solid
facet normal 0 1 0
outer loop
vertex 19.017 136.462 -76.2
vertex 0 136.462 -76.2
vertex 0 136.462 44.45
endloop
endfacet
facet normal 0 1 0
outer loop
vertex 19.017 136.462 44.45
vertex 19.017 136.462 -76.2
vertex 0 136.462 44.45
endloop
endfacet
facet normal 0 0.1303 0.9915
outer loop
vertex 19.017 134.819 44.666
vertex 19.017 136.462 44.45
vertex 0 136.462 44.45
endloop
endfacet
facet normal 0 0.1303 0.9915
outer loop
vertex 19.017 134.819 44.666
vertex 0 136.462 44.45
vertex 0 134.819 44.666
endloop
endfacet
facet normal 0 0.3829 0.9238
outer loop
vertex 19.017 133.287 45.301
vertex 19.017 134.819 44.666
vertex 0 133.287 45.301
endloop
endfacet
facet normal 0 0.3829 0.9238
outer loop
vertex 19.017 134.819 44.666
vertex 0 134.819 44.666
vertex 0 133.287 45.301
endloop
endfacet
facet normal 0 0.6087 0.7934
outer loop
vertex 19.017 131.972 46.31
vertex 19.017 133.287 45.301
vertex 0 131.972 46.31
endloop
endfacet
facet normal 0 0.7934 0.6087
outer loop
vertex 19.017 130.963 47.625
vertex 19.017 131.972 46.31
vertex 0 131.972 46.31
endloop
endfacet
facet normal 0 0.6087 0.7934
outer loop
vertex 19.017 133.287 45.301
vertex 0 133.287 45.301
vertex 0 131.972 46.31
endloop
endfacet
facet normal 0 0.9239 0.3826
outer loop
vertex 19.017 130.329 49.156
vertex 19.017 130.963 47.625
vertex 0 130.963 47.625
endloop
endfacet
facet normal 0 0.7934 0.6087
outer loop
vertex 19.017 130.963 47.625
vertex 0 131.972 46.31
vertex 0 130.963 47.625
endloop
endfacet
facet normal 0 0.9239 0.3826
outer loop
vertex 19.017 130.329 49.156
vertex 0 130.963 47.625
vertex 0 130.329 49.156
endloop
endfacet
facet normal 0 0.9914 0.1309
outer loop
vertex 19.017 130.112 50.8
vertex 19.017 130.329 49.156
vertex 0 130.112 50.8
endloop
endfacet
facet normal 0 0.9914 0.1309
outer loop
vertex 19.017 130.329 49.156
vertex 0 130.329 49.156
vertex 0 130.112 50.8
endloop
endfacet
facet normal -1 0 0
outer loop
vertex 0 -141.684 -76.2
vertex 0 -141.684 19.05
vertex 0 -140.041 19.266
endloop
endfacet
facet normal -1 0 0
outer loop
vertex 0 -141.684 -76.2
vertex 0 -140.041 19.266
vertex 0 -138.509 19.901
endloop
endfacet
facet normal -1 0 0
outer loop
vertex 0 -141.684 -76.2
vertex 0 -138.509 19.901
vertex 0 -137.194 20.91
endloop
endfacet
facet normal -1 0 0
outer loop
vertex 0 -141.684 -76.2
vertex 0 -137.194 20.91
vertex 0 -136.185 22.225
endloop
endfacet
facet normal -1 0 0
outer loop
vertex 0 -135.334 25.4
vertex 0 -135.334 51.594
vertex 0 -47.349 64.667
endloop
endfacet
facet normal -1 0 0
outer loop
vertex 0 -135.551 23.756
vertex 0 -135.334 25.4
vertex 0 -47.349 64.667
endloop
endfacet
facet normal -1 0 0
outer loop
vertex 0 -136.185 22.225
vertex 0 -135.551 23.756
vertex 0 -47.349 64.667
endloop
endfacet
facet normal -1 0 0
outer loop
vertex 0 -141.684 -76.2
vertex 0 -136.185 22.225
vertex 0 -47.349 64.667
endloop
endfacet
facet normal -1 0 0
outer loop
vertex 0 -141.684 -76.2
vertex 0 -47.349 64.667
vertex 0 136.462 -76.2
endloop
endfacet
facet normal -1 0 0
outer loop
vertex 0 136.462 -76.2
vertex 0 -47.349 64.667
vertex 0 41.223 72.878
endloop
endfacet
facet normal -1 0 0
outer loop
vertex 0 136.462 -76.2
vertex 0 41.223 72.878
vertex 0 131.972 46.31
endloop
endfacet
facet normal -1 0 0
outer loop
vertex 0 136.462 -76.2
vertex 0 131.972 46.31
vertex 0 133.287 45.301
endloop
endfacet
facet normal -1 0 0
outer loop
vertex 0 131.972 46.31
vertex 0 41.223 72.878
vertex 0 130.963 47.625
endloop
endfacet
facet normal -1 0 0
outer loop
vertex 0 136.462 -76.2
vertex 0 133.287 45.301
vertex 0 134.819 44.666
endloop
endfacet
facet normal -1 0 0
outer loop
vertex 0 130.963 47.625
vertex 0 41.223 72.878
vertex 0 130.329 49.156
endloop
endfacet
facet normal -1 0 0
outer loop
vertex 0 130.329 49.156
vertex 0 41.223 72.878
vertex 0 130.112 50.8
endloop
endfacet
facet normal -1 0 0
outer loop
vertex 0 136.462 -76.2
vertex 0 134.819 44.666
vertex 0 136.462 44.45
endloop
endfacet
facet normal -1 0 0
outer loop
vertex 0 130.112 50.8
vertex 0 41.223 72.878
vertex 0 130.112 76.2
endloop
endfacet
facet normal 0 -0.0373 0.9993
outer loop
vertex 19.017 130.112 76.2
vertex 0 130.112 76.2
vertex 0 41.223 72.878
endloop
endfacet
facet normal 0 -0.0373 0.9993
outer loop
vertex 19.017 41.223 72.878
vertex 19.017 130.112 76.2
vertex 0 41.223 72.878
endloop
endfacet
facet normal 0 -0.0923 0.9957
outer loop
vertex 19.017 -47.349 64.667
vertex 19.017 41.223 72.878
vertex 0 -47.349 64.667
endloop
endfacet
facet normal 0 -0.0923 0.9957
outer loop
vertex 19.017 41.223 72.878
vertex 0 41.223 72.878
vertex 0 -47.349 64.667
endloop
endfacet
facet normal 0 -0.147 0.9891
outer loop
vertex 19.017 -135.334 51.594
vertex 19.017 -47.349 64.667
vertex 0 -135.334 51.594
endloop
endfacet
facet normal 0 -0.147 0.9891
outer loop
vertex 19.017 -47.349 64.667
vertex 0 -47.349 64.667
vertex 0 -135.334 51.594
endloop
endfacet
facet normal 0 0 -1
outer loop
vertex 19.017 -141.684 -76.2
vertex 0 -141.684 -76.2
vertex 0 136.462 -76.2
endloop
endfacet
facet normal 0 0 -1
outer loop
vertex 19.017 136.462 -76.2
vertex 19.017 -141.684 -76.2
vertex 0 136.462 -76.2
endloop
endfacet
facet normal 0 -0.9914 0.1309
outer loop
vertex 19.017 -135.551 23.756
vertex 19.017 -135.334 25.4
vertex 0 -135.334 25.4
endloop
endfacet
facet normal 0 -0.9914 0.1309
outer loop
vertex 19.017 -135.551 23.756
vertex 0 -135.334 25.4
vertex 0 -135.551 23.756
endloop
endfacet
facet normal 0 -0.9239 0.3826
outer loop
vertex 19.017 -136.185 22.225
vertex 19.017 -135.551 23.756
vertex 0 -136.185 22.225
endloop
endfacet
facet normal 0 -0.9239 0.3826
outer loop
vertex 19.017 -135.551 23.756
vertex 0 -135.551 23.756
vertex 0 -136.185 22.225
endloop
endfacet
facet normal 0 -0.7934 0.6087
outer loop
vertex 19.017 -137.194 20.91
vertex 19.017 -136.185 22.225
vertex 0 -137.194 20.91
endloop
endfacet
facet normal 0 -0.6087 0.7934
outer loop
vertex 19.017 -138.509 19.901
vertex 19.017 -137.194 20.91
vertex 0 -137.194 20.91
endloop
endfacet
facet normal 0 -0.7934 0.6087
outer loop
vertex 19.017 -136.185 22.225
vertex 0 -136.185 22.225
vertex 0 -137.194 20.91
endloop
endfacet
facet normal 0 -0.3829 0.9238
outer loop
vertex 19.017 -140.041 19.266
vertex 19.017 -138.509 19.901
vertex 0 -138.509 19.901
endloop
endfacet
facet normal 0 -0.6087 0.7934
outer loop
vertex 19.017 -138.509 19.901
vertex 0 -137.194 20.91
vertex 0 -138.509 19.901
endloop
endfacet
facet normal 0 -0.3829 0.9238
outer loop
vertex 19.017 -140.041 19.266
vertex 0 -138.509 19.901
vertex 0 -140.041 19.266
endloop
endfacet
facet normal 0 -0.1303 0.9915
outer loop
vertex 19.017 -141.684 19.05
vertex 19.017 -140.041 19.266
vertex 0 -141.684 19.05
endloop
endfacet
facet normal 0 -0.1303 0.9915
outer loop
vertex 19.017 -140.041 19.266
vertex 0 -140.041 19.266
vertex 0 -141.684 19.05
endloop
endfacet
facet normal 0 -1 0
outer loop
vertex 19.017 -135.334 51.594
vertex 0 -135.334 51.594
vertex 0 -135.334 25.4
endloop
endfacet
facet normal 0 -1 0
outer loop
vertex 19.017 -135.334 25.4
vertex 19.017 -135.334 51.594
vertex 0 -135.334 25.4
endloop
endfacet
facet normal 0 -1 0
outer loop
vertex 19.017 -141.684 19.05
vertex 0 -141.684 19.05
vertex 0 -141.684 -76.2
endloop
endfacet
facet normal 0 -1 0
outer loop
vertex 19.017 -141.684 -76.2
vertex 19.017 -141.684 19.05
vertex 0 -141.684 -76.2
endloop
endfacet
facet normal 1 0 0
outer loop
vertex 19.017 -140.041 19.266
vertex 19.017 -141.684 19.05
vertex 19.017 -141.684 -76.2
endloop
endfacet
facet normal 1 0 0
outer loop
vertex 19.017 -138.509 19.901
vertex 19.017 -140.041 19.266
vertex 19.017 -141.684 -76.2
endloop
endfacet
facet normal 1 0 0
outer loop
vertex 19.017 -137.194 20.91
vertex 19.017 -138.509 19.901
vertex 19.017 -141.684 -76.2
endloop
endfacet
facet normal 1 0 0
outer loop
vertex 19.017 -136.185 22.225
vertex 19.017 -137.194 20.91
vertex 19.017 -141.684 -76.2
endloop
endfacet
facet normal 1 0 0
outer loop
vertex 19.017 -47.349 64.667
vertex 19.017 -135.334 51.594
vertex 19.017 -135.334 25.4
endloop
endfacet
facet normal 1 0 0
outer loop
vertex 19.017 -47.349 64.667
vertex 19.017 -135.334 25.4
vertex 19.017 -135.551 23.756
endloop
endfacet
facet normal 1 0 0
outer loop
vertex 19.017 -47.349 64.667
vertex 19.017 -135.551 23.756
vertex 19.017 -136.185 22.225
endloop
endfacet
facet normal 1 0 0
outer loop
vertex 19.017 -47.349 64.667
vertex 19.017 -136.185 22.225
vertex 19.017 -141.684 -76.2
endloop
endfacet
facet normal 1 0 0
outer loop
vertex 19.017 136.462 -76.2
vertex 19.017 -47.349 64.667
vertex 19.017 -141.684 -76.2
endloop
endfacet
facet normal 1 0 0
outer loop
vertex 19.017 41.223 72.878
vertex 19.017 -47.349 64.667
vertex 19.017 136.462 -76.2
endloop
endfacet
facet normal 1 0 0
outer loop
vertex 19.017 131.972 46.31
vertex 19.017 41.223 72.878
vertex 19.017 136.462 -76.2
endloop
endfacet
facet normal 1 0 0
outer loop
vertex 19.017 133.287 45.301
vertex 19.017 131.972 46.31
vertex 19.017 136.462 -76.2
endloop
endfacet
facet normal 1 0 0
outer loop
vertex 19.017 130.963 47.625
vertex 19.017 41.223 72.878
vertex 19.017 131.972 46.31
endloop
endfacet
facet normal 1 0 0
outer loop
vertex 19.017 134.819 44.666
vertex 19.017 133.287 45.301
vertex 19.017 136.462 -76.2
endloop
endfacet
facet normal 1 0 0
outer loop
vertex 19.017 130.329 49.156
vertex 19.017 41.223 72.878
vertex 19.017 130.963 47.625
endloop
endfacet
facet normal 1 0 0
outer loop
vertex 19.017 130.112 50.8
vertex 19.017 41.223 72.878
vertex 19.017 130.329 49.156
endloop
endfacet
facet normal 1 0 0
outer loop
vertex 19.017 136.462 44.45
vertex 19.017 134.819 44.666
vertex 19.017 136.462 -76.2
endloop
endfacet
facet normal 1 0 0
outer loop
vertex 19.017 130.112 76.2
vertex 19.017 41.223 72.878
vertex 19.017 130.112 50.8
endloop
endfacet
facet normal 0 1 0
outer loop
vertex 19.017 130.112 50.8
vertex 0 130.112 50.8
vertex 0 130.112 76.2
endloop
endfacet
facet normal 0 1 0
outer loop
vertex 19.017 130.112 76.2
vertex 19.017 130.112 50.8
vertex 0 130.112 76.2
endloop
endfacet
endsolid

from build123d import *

# Parameters (mm, degrees)
F1_DEPTH = 19.01698


with BuildPart() as f1:
    # F0 (on Right) → F1 (new body)
    with BuildSketch(Plane.YZ):
        with BuildLine():
            Line((-141.684375, -76.2), (136.462135, -76.2))
            Line((136.462135, -76.2), (136.462135, 44.45))
            ThreePointArc((136.462135, 44.45), (131.972007, 46.309872), (130.112135, 50.8))
            Line((130.112135, 50.8), (130.112135, 76.2))
            ThreePointArc((130.112135, 76.2), (-3.119611, 69.38236), (-135.334375, 51.59375))
            Line((-135.334375, 51.59375), (-135.334375, 25.4))
            ThreePointArc((-135.334375, 25.4), (-137.194247, 20.909872), (-141.684375, 19.05))
            Line((-141.684375, 19.05), (-141.684375, -76.2))
        make_face()
    extrude(amount=F1_DEPTH)


solid = f1.part
